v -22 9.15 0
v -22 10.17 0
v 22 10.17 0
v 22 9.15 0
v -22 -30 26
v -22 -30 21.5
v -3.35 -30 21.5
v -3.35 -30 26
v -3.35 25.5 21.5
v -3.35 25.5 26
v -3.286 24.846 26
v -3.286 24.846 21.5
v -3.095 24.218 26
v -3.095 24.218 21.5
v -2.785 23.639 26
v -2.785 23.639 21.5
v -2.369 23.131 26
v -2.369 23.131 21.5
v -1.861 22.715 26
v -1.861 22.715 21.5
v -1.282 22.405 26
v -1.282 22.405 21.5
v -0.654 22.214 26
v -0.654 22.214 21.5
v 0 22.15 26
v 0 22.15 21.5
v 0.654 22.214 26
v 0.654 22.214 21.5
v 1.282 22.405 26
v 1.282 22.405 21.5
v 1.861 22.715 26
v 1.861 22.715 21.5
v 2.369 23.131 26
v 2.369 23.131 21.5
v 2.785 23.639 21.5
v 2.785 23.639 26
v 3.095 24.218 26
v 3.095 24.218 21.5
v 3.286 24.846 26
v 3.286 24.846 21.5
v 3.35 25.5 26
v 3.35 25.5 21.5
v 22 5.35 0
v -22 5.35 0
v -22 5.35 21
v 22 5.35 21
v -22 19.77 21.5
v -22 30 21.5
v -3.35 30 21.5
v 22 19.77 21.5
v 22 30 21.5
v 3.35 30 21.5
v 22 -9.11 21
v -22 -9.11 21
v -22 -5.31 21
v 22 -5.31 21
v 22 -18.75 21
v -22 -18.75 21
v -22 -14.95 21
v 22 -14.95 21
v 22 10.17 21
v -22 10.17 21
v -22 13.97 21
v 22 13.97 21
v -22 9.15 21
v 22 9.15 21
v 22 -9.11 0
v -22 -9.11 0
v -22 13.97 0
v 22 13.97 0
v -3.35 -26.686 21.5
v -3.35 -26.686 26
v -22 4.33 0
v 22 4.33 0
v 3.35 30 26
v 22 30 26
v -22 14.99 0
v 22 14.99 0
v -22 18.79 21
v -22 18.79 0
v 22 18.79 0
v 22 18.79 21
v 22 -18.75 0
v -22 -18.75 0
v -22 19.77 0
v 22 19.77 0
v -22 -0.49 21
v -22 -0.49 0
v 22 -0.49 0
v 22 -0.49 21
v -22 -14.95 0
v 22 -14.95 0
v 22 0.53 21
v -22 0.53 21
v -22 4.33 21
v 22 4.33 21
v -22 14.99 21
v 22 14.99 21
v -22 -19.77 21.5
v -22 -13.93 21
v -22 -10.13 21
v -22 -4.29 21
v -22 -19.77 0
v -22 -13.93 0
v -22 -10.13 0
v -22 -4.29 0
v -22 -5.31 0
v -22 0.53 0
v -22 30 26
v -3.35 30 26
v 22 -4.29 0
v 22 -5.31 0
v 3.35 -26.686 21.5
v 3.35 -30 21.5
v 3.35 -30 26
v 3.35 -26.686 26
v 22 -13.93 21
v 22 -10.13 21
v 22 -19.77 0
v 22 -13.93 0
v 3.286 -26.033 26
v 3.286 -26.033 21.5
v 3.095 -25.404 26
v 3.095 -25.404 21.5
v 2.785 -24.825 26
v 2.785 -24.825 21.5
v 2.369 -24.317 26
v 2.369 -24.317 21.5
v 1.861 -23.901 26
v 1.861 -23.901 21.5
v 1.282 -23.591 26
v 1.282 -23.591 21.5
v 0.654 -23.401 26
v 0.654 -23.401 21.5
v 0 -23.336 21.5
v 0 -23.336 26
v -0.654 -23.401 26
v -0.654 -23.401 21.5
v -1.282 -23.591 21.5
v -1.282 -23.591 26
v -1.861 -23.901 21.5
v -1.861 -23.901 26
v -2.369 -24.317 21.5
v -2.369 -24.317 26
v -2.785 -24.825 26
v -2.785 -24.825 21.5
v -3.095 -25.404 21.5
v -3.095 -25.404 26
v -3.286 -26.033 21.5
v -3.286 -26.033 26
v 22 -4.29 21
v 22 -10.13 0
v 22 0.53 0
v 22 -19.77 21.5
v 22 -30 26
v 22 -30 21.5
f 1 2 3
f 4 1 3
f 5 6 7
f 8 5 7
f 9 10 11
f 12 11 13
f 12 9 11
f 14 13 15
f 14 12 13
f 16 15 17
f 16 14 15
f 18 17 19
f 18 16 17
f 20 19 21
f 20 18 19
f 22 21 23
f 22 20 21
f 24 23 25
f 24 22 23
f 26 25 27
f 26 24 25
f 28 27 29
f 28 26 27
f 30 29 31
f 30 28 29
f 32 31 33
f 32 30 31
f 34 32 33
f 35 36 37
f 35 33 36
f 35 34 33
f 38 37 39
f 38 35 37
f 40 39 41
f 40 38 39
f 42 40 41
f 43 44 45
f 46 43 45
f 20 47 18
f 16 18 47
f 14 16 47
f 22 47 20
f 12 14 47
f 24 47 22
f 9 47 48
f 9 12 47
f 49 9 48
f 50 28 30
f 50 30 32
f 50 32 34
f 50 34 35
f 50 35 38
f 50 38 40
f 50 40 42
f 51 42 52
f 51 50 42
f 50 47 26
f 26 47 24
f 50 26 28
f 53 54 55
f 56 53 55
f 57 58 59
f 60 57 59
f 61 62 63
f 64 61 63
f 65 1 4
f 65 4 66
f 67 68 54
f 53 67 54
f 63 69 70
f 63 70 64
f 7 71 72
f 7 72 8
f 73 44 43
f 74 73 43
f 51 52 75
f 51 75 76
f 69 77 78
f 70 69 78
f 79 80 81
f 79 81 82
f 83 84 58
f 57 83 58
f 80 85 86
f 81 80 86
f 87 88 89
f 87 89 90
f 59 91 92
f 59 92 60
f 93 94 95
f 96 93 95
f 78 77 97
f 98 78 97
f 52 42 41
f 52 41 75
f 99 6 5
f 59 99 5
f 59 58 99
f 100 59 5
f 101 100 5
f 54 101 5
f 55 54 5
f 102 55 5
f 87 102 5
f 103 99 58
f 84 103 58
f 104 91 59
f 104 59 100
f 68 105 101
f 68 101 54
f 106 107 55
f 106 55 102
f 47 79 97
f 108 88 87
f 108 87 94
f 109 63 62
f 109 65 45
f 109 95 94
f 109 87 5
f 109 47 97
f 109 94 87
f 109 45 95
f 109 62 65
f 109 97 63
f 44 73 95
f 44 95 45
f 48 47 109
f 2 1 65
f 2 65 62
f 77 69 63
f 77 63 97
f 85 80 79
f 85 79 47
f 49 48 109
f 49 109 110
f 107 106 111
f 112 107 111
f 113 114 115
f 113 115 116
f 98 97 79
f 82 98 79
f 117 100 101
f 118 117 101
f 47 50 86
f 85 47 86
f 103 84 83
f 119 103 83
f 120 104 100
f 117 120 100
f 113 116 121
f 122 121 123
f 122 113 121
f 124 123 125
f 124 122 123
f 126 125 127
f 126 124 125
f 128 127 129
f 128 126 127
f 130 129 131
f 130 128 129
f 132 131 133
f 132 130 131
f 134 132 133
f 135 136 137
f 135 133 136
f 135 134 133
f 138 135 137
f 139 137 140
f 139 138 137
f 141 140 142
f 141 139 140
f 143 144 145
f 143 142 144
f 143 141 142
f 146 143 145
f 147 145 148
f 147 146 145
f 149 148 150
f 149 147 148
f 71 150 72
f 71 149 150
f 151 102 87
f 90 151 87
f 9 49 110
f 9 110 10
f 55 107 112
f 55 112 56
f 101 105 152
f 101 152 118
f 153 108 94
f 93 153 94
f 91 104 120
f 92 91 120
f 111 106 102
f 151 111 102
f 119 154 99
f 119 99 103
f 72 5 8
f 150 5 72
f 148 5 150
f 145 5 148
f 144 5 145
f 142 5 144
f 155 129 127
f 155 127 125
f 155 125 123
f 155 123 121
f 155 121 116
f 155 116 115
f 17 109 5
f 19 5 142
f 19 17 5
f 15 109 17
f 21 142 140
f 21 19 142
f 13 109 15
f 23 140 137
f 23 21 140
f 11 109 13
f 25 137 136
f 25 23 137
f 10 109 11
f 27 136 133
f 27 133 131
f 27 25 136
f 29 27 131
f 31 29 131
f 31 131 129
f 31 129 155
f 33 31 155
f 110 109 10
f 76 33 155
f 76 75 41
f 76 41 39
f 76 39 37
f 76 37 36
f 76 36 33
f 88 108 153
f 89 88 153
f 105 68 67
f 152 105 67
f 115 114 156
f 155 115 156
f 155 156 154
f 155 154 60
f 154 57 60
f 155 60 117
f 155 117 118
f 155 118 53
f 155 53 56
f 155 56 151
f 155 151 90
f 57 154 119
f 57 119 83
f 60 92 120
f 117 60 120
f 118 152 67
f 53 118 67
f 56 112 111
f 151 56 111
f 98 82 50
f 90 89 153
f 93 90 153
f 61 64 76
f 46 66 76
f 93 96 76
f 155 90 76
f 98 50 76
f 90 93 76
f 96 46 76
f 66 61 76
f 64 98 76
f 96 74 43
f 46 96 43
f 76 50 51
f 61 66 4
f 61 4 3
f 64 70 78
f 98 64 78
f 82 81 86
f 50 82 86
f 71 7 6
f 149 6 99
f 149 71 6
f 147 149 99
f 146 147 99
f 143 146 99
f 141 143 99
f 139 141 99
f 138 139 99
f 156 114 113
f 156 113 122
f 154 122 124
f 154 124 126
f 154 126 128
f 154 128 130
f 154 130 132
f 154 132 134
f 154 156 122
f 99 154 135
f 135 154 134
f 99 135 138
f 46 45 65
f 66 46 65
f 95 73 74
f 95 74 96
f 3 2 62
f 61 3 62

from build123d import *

# Parameters (mm, degrees)
SCHIZZO1_W                   = 44
SCHIZZO1_H                   = 60
ESTRUSIONE_ESTRUSIONE1_DEPTH = 26
SCHIZZO2_W                   = 21
SCHIZZO2_H                   = 3.8
TAGLIO_ESTRUSIONE1_DEPTH     = 45
RIPETIZIONE_A_L1_COUNT       = 8
RIPETIZIONE_A_L1_PITCH       = 4.82
SCHIZZO3_W                   = 21.5
SCHIZZO3_H                   = 10.23
TAGLIO_ESTRUSIONE2_DEPTH     = 45
TAGLIO_ESTRUSIONE4_DEPTH     = 5.5


with BuildPart() as part:
    # Schizzo1 → Estrusione-Estrusione1 (new body)
    with BuildSketch(Plane.XY):
        Rectangle(SCHIZZO1_W, SCHIZZO1_H)
    extrude(amount=ESTRUSIONE_ESTRUSIONE1_DEPTH)

    # Schizzo2 → Taglio-Estrusione1 (cut, through all)
    with BuildSketch(Plane.ZY.offset(22)):
        with Locations((10.5, -16.85)):
            Rectangle(SCHIZZO2_W, SCHIZZO2_H)
    taglio_estrusione1 = extrude(amount=-TAGLIO_ESTRUSIONE1_DEPTH, mode=Mode.SUBTRACT)

    # Ripetizione a L1: Taglio-Estrusione1 ×8
    with Locations(*[(0, i * RIPETIZIONE_A_L1_PITCH, 0) for i in range(1, RIPETIZIONE_A_L1_COUNT)]):
        add(taglio_estrusione1, mode=Mode.SUBTRACT)

    # Schizzo3 → Taglio-Estrusione2 (cut, through all)
    with BuildSketch(Plane(origin=(22, 0, 0), x_dir=(0, 0, -1), z_dir=(1, 0, 0))):
        with Locations((-10.75, -24.885)):
            Rectangle(SCHIZZO3_W, SCHIZZO3_H)
        with Locations((-10.75, 24.885)):
            Rectangle(SCHIZZO3_W, SCHIZZO3_H)
    extrude(amount=-TAGLIO_ESTRUSIONE2_DEPTH, mode=Mode.SUBTRACT)

    # Schizzo5 → Taglio-Estrusione4 (cut, through all)
    with BuildSketch(Plane(origin=(0, 0, 21.5), x_dir=(-1, 0, 0), z_dir=(0, 0, -1))):
        with BuildLine():
            Line((3.35, 34.5), (3.35, 25.5))
            ThreePointArc((3.35, 25.5), (0, 22.15), (-3.35, 25.5))
            Line((-3.35, 25.5), (-3.35, 34.5))
            ThreePointArc((-3.35, 34.5), (0, 37.85), (3.35, 34.5))
        make_face()
        with BuildLine():
            Line((-3.35, -33.313801036), (-3.35, -26.686198964))
            ThreePointArc((-3.35, -26.686198964), (0, -23.336198964), (3.35, -26.686198964))
            Line((3.35, -26.686198964), (3.35, -33.313801036))
            ThreePointArc((3.35, -33.313801036), (0, -36.663801036), (-3.35, -33.313801036))
        make_face()
    extrude(amount=-TAGLIO_ESTRUSIONE4_DEPTH, mode=Mode.SUBTRACT)


solid = part.part
